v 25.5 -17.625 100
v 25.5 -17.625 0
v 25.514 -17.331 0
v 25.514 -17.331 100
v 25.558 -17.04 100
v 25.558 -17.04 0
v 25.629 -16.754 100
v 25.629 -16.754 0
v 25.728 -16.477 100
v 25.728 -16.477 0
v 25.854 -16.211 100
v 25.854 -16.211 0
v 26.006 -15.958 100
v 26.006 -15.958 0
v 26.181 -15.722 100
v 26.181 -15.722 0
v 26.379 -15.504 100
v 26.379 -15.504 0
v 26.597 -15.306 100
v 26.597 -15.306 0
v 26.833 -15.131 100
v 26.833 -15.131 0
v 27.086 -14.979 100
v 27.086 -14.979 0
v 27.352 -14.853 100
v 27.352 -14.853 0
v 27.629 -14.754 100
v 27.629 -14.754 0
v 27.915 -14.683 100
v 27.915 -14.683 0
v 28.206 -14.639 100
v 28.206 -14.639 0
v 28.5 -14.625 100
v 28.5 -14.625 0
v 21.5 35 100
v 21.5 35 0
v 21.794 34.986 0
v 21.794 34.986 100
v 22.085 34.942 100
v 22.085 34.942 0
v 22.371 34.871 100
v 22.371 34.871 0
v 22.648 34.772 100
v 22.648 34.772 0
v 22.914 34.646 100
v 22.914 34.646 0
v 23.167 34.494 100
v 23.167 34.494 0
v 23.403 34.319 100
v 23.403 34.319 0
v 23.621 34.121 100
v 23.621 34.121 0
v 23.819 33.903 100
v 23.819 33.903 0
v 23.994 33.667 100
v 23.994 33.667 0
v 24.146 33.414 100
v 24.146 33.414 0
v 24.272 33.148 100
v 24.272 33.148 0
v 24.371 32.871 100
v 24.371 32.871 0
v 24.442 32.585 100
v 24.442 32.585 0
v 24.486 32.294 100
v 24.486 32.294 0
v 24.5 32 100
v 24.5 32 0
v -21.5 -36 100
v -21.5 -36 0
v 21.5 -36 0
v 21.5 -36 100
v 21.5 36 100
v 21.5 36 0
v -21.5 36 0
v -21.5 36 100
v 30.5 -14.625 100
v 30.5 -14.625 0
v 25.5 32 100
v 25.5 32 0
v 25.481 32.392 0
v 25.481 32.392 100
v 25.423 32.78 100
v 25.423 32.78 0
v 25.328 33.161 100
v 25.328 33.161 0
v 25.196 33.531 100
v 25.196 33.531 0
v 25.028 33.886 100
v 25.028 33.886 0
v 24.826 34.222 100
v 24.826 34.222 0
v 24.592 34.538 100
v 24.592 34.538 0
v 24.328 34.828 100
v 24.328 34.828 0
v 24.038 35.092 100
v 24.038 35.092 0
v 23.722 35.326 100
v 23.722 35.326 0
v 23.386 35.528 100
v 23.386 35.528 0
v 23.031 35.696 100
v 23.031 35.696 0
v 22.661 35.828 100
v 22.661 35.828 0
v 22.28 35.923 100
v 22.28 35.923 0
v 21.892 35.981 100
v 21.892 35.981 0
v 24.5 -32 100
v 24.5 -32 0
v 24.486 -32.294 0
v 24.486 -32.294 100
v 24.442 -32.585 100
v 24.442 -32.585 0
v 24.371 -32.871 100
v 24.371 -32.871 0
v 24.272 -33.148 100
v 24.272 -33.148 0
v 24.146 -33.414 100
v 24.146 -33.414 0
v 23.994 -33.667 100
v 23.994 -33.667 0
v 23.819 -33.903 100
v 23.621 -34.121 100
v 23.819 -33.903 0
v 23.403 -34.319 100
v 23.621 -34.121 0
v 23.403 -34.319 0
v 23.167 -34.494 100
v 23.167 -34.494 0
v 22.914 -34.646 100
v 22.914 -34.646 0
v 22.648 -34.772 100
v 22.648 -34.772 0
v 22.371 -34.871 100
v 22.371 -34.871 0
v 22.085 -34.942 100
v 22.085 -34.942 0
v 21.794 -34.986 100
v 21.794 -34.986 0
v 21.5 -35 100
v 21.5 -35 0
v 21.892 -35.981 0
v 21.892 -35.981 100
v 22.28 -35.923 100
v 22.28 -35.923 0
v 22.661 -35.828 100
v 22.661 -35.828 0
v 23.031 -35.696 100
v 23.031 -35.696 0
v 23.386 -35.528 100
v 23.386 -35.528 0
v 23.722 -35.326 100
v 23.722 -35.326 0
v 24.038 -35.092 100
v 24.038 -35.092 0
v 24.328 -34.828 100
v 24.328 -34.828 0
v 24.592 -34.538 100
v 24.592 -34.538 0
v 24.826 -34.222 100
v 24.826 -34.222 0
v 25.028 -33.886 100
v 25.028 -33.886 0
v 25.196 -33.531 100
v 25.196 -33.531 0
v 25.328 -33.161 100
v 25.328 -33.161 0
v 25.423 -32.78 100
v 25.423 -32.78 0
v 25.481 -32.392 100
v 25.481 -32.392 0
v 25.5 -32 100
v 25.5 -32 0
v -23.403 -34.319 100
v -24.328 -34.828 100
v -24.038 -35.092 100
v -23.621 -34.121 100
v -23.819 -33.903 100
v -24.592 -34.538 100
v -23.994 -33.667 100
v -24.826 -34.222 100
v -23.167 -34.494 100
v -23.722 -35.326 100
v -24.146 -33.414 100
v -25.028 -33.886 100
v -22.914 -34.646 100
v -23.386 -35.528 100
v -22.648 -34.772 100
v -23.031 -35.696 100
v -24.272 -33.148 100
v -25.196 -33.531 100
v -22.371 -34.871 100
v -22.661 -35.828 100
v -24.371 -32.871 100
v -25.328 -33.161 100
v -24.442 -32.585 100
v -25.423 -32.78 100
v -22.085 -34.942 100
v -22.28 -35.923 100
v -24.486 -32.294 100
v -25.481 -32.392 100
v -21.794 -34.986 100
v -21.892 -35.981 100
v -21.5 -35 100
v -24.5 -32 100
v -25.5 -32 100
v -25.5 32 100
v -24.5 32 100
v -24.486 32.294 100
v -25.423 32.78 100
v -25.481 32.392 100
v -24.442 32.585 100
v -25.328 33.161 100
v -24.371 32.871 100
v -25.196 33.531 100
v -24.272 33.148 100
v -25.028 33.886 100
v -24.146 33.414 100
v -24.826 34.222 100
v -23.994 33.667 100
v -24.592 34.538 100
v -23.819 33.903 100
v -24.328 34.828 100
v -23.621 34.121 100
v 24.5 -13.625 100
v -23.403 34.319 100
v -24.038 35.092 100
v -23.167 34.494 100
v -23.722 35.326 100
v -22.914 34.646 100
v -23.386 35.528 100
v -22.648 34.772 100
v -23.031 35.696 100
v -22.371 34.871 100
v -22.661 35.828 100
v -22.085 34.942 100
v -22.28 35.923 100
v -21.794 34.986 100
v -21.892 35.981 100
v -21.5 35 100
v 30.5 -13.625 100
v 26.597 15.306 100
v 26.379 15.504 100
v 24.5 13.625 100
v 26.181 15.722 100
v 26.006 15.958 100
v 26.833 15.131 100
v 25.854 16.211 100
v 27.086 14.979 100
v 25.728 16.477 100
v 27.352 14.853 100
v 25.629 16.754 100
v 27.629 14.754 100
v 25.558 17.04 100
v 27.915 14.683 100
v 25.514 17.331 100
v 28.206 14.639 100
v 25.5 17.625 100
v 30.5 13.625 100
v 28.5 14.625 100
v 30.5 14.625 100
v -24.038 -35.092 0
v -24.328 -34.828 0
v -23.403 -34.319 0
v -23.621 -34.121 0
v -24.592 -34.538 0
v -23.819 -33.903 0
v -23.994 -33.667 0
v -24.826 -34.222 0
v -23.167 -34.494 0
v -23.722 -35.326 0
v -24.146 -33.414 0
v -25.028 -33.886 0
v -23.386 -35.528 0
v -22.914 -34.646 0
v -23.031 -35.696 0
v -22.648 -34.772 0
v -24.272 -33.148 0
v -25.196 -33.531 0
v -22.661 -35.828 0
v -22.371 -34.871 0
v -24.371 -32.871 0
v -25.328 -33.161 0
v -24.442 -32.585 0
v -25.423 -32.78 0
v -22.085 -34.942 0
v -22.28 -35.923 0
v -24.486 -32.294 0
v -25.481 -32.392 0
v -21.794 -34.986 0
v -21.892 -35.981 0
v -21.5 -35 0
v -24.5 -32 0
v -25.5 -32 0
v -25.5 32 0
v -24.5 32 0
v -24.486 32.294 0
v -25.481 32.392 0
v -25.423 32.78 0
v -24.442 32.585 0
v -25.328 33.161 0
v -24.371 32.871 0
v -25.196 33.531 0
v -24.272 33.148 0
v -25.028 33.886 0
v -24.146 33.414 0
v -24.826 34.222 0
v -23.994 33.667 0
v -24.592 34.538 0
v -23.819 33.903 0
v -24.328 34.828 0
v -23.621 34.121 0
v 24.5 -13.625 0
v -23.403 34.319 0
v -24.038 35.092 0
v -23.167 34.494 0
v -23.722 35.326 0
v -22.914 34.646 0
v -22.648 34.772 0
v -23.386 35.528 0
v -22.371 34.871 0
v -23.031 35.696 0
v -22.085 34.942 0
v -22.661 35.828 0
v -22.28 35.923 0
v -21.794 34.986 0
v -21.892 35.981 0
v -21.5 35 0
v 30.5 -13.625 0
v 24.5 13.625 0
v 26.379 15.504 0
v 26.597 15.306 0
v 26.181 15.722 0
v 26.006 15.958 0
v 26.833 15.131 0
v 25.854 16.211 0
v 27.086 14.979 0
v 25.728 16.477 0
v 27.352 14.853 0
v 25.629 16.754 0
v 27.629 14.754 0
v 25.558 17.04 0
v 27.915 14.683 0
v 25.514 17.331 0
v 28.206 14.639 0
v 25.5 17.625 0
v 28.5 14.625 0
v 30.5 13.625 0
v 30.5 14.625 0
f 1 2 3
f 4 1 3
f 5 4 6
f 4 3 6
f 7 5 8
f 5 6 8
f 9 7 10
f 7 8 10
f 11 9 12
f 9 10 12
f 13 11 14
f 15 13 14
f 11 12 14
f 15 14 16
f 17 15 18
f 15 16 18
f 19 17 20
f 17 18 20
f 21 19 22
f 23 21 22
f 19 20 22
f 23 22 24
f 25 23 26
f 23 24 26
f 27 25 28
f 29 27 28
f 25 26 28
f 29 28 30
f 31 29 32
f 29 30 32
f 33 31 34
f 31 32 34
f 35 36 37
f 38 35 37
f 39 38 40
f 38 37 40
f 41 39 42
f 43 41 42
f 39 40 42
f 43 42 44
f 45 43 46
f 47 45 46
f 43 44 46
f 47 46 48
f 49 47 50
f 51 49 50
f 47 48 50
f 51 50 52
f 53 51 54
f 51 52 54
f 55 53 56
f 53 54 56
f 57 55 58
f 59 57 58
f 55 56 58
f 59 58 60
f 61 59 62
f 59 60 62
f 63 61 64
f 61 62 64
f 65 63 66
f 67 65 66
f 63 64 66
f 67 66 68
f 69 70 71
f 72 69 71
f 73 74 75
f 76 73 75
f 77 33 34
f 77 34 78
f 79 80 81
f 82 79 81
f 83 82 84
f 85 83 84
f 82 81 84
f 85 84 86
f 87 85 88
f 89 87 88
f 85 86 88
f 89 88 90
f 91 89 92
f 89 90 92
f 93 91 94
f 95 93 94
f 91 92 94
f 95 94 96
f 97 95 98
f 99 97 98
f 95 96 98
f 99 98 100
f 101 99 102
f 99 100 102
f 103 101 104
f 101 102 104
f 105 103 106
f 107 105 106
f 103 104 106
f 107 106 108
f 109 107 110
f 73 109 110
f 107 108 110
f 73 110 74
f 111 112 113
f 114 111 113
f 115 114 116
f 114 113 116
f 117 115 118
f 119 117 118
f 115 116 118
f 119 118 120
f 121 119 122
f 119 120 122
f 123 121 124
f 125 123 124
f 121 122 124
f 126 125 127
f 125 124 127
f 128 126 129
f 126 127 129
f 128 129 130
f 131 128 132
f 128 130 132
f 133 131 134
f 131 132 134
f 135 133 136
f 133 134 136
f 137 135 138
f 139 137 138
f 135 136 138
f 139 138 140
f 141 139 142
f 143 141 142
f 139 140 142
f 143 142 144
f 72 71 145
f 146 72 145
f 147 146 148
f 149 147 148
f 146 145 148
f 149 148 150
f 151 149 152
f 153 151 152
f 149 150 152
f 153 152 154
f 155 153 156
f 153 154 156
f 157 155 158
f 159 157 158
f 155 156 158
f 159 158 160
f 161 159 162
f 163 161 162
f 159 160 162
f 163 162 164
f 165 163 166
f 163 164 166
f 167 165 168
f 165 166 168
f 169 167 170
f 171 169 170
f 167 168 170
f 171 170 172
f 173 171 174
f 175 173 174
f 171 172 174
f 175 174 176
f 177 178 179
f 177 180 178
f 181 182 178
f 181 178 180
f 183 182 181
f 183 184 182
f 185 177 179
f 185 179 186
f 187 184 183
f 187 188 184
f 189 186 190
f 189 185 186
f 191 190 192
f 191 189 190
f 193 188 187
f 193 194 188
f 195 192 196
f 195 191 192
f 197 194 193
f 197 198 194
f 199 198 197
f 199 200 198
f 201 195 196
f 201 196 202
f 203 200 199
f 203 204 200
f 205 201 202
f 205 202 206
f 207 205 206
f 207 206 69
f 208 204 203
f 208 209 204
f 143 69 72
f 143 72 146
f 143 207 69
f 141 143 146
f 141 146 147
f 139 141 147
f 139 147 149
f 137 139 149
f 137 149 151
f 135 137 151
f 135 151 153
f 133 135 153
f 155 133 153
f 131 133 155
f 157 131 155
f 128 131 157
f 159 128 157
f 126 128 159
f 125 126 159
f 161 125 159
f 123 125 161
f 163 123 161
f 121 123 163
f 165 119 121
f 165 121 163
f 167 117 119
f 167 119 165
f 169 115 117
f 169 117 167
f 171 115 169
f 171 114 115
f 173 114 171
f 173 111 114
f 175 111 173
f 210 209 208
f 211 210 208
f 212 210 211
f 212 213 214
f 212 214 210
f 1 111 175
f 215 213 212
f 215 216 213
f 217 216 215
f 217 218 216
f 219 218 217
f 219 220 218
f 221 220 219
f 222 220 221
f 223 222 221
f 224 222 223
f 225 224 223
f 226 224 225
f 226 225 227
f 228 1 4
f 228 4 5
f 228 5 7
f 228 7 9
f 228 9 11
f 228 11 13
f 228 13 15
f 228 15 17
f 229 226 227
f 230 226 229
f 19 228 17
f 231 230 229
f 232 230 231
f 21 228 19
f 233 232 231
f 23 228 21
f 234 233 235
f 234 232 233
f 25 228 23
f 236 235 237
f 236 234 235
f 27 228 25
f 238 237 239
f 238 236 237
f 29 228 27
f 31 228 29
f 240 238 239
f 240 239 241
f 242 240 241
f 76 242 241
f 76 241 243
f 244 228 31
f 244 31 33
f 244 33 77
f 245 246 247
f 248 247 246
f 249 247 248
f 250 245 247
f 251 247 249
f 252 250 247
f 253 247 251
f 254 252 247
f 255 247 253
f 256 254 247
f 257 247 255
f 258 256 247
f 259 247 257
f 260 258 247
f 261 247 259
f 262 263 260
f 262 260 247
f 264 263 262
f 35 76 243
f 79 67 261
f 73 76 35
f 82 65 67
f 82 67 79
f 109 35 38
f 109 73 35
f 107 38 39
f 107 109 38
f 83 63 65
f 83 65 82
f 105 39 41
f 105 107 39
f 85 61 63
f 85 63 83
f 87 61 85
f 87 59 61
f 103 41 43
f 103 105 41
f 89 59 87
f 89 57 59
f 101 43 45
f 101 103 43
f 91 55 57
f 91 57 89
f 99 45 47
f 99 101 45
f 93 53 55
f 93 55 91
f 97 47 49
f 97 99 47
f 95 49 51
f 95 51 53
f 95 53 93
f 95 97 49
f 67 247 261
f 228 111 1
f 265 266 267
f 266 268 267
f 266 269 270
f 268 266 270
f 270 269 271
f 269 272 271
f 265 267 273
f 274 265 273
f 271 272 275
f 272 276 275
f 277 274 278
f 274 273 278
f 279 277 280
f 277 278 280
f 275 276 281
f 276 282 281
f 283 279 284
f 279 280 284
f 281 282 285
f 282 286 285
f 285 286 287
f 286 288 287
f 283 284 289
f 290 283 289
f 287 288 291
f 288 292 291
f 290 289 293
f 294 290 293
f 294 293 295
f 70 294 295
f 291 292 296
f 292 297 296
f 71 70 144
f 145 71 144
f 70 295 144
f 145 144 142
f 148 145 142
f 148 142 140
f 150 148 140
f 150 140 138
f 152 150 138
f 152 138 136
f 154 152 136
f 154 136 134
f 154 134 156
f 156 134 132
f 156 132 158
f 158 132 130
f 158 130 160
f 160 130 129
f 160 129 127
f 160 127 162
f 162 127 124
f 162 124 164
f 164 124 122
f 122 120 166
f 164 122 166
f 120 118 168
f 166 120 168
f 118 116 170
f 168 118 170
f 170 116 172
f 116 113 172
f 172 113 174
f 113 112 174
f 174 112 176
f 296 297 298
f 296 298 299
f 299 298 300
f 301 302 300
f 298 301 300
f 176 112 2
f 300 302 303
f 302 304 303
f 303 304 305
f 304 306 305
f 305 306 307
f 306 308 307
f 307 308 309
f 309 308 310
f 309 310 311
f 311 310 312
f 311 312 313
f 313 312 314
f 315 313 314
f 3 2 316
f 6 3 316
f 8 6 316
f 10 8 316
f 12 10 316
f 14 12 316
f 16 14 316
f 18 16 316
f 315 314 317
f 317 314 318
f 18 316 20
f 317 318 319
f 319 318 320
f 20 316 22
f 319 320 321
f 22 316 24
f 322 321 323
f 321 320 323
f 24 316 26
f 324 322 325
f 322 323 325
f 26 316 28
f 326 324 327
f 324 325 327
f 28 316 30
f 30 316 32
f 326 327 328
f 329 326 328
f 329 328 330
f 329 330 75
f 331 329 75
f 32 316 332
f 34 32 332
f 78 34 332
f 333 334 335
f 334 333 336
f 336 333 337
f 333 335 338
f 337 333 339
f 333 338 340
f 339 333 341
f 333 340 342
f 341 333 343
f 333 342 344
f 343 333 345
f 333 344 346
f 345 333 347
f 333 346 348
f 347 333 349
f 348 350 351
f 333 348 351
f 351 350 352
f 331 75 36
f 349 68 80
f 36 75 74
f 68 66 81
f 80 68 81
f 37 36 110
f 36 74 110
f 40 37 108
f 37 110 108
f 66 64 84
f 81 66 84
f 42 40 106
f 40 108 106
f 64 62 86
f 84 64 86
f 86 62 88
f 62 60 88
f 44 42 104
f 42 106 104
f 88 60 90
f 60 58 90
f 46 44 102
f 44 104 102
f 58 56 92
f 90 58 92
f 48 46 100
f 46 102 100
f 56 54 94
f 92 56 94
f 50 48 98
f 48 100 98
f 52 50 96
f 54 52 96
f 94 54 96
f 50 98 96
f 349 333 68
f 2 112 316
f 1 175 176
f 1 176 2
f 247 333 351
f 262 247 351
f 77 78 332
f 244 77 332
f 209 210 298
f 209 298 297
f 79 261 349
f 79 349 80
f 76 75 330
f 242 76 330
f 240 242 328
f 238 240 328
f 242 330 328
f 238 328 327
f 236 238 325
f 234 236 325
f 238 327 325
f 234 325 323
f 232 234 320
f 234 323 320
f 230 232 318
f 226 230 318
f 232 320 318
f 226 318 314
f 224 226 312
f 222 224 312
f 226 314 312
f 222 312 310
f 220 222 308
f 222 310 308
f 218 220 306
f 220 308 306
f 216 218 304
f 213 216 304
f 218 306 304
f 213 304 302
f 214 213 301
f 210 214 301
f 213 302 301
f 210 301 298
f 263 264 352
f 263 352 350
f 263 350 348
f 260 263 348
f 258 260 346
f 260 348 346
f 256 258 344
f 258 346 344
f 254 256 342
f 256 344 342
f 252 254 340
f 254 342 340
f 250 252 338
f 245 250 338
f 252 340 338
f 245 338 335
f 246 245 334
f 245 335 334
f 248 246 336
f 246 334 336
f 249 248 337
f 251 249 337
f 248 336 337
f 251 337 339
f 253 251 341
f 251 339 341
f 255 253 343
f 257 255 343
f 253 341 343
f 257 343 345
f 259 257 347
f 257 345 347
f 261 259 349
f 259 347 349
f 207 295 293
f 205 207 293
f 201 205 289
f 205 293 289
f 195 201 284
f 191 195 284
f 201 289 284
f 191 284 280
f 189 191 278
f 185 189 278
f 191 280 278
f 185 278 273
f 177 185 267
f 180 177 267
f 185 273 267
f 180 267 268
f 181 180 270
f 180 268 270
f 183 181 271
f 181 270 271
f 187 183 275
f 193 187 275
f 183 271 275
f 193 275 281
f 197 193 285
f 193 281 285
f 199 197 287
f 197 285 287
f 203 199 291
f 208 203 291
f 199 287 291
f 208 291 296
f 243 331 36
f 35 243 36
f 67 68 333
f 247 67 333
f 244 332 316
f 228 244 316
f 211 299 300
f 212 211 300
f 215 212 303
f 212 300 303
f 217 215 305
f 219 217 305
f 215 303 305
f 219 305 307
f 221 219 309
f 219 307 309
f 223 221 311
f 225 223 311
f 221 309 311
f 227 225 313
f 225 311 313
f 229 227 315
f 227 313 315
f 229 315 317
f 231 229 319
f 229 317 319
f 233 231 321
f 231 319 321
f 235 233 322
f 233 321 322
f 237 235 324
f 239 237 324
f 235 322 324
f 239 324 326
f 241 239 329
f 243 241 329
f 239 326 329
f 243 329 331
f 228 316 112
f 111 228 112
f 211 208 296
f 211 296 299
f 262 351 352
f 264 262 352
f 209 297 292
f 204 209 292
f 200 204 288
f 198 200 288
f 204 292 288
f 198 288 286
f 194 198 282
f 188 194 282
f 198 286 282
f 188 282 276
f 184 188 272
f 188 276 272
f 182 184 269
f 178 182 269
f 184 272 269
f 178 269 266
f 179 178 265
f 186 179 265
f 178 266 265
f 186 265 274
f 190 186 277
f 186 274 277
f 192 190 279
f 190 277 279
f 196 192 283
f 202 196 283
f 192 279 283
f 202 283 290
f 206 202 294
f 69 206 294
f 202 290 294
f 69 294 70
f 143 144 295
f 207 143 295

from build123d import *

# Parameters (mm, degrees)
F1_DEPTH = 100


# Not quite as in the source:
# - a feature names something its author has since deleted; it is built from what else it names


with BuildPart() as f1:
    # F0 (on Top) → F1 (new body)
    with BuildSketch(Plane.XY):
        with BuildLine():
            Line((-21.5, 35), (21.5, 35))
            ThreePointArc((21.5, 35), (23.6213203436, 34.1213203436), (24.5, 32))
            Line((24.5, 32), (24.5, 13.625))
            Line((24.5, 13.625), (30.5, 13.625))
            Line((30.5, 13.625), (30.5, 14.625))
            Line((30.5, 14.625), (28.5, 14.625))
            ThreePointArc((28.5, 14.625), (26.3786796564, 15.5036796564), (25.5, 17.625))
            Line((25.5, 17.625), (25.5, 32))
            ThreePointArc((25.5, 32), (24.3284271247, 34.8284271247), (21.5, 36))
            Line((21.5, 36), (-21.5, 36))
            ThreePointArc((-21.5, 36), (-24.3284271247, 34.8284271247), (-25.5, 32))
            Line((-25.5, 32), (-25.5, -32))
            ThreePointArc((-25.5, -32), (-24.3284271247, -34.8284271247), (-21.5, -36))
            Line((-21.5, -36), (21.5, -36))
            ThreePointArc((21.5, -36), (24.3284271247, -34.8284271247), (25.5, -32))
            Line((25.5, -32), (25.5, -17.625))
            ThreePointArc((25.5, -17.625), (26.3786796564, -15.5036796564), (28.5, -14.625))
            Line((28.5, -14.625), (30.5, -14.625))
            Line((30.5, -14.625), (30.5, -13.625))
            Line((30.5, -13.625), (24.5, -13.625))
            Line((24.5, -13.625), (24.5, -32))
            ThreePointArc((24.5, -32), (23.6213203436, -34.1213203436), (21.5, -35))
            Line((21.5, -35), (-21.5, -35))
            ThreePointArc((-21.5, -35), (-23.6213203436, -34.1213203436), (-24.5, -32))
            Line((-24.5, -32), (-24.5, 32))
            ThreePointArc((-24.5, 32), (-23.6213203436, 34.1213203436), (-21.5, 35))
        make_face()
    extrude(amount=F1_DEPTH)


solid = f1.part
